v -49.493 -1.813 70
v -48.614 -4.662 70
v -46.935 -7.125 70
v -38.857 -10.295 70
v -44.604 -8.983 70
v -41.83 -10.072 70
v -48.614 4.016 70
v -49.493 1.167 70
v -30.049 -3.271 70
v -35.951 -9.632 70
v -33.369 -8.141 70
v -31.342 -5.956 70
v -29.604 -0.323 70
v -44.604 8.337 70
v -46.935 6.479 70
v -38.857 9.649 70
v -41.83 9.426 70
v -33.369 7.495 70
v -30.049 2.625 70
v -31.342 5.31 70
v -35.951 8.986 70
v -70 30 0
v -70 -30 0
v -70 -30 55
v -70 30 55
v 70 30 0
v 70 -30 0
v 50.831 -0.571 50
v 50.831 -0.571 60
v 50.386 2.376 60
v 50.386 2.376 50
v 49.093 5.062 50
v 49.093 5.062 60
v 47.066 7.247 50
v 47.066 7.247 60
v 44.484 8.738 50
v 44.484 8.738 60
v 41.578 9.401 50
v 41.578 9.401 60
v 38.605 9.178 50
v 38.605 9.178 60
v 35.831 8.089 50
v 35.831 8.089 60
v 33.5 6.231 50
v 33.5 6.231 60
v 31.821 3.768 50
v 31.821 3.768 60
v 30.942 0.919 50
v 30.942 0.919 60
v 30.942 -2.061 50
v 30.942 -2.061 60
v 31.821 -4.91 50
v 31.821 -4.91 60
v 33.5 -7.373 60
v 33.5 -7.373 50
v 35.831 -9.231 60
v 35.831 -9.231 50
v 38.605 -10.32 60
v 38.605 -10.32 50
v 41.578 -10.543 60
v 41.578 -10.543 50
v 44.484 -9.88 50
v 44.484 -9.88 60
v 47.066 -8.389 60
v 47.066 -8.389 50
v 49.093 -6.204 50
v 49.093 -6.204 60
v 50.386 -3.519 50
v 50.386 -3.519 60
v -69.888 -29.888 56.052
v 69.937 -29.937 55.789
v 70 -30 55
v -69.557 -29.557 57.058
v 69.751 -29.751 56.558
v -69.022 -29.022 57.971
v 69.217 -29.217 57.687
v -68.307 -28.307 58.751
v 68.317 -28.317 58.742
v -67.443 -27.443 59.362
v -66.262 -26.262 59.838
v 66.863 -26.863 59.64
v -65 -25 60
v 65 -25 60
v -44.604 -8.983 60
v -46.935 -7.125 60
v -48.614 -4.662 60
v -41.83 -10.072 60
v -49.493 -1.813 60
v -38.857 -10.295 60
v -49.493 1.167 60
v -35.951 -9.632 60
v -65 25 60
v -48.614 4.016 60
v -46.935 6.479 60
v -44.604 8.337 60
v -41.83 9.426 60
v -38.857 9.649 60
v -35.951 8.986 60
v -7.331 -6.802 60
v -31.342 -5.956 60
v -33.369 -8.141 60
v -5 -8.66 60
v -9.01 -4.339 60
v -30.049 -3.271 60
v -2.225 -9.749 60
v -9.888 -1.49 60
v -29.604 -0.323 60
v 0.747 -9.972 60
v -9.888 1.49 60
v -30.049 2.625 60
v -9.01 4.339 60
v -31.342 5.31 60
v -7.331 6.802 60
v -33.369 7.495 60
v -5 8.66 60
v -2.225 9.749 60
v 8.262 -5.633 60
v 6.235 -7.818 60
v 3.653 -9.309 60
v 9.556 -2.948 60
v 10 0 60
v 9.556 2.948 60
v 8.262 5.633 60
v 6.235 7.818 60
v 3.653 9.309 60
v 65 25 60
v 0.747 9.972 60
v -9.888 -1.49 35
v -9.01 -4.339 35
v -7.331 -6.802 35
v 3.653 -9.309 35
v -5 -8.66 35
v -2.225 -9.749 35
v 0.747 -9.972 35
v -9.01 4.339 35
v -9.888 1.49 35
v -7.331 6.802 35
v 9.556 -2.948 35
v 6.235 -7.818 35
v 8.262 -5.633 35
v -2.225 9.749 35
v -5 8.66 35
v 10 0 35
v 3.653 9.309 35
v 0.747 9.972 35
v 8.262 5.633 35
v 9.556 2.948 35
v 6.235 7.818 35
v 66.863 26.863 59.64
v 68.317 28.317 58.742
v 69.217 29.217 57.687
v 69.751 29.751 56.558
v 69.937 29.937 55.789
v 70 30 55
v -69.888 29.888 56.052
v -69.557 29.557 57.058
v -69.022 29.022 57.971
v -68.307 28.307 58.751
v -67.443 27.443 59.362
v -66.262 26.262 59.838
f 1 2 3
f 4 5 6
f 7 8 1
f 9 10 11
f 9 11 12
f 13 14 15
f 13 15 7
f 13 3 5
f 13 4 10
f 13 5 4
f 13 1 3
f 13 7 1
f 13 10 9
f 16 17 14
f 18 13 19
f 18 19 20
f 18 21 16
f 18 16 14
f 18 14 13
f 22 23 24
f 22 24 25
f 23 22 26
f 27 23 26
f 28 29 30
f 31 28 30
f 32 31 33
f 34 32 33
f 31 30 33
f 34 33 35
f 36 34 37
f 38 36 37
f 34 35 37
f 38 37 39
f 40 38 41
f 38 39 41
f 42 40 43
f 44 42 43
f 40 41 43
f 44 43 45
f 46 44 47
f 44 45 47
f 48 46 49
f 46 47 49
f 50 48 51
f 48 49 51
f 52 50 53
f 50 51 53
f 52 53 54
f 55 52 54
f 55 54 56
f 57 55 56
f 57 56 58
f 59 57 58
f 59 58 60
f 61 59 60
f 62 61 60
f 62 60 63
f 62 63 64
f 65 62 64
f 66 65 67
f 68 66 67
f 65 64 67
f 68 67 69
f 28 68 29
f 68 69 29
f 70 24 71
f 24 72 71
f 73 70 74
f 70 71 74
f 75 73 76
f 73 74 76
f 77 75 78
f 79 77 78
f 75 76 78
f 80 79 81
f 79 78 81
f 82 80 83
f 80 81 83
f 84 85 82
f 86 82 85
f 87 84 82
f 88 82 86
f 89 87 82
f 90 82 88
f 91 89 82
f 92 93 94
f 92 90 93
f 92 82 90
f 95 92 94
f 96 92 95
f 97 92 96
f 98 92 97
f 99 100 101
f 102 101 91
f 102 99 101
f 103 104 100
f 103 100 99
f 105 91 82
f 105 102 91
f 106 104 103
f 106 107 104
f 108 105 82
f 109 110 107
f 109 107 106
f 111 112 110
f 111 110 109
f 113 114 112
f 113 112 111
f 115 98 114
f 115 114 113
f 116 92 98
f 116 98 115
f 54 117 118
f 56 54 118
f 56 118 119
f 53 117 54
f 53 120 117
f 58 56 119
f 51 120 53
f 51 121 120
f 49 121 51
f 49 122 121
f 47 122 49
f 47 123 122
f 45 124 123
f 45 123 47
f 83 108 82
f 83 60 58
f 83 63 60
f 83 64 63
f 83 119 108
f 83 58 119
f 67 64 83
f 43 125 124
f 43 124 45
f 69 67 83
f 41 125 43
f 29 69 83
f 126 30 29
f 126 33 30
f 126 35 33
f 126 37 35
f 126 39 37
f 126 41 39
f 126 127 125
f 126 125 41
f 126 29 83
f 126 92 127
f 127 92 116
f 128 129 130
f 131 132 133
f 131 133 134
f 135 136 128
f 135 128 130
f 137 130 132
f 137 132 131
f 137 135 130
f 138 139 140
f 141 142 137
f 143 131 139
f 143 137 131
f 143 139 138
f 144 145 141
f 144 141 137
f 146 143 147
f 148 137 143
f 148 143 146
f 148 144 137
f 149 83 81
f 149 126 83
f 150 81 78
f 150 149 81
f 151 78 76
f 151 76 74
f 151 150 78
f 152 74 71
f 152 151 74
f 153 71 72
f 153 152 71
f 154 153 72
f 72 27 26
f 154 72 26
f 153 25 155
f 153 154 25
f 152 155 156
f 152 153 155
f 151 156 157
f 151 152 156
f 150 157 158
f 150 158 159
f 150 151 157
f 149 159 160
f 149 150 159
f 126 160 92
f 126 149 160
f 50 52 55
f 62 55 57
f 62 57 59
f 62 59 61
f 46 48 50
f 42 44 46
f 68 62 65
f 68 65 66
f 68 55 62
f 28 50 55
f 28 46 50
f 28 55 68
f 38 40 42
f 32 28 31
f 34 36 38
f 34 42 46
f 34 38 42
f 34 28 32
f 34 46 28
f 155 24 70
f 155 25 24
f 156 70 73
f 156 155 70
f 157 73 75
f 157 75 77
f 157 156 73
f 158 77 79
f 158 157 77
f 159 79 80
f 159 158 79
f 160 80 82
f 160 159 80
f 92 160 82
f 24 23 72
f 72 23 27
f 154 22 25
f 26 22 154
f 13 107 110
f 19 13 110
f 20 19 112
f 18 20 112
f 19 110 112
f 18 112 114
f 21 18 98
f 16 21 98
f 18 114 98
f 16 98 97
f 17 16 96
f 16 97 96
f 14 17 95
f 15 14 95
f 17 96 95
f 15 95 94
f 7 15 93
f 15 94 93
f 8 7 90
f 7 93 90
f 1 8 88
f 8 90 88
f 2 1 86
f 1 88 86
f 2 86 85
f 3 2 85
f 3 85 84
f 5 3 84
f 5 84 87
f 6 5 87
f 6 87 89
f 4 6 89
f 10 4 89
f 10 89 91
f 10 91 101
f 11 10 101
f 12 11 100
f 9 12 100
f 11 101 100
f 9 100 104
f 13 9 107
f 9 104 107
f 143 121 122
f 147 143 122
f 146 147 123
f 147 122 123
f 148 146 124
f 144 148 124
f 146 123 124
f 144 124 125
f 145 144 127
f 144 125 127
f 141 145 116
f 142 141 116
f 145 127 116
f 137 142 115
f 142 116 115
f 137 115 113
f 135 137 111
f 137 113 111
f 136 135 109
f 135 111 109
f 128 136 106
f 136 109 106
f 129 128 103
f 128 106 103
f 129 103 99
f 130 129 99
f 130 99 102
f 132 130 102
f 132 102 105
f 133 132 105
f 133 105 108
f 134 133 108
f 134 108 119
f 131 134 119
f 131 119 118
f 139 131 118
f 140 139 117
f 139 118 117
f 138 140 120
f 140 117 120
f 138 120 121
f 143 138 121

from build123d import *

# Parameters (mm, degrees)
F0_W     = 140
F0_H     = 60
F1_DEPTH = 60
F3_R     = 10
F6_DEPTH = 10
F4_R     = 10
F7_DEPTH = 25
F5_R     = 10
F8_DEPTH = 10
F9_R     = 5


with BuildPart() as f1:
    # F0 (on Top) → F1 (new body)
    with BuildSketch(Plane.XY):
        Rectangle(F0_W, F0_H)
    extrude(amount=F1_DEPTH)

    # F3 (on face) → F6 (join)
    with BuildSketch(Plane.XY.offset(60)):
        with Locations((-39.604324, -0.323002)):
            Circle(F3_R)
    extrude(amount=F6_DEPTH)

    # F4 (on face) → F7 (cut)
    with BuildSketch(Plane.XY.offset(60)):
        Circle(F4_R)
    extrude(amount=-F7_DEPTH, mode=Mode.SUBTRACT)

    # F5 (on face) → F8 (cut)
    with BuildSketch(Plane.XY.offset(60)):
        with Locations((40.830696, -0.571058)):
            Circle(F5_R)
    extrude(amount=-F8_DEPTH, mode=Mode.SUBTRACT)

    # F9
    f9_edges = [f1.edges().sort_by_distance(p)[0] for p in [
        (-70, 0, 60),
        (70, 0, 60),
        (0, -30, 60),
        (0, 30, 60),
    ]]
    fillet(f9_edges, radius=F9_R)


solid = f1.part
